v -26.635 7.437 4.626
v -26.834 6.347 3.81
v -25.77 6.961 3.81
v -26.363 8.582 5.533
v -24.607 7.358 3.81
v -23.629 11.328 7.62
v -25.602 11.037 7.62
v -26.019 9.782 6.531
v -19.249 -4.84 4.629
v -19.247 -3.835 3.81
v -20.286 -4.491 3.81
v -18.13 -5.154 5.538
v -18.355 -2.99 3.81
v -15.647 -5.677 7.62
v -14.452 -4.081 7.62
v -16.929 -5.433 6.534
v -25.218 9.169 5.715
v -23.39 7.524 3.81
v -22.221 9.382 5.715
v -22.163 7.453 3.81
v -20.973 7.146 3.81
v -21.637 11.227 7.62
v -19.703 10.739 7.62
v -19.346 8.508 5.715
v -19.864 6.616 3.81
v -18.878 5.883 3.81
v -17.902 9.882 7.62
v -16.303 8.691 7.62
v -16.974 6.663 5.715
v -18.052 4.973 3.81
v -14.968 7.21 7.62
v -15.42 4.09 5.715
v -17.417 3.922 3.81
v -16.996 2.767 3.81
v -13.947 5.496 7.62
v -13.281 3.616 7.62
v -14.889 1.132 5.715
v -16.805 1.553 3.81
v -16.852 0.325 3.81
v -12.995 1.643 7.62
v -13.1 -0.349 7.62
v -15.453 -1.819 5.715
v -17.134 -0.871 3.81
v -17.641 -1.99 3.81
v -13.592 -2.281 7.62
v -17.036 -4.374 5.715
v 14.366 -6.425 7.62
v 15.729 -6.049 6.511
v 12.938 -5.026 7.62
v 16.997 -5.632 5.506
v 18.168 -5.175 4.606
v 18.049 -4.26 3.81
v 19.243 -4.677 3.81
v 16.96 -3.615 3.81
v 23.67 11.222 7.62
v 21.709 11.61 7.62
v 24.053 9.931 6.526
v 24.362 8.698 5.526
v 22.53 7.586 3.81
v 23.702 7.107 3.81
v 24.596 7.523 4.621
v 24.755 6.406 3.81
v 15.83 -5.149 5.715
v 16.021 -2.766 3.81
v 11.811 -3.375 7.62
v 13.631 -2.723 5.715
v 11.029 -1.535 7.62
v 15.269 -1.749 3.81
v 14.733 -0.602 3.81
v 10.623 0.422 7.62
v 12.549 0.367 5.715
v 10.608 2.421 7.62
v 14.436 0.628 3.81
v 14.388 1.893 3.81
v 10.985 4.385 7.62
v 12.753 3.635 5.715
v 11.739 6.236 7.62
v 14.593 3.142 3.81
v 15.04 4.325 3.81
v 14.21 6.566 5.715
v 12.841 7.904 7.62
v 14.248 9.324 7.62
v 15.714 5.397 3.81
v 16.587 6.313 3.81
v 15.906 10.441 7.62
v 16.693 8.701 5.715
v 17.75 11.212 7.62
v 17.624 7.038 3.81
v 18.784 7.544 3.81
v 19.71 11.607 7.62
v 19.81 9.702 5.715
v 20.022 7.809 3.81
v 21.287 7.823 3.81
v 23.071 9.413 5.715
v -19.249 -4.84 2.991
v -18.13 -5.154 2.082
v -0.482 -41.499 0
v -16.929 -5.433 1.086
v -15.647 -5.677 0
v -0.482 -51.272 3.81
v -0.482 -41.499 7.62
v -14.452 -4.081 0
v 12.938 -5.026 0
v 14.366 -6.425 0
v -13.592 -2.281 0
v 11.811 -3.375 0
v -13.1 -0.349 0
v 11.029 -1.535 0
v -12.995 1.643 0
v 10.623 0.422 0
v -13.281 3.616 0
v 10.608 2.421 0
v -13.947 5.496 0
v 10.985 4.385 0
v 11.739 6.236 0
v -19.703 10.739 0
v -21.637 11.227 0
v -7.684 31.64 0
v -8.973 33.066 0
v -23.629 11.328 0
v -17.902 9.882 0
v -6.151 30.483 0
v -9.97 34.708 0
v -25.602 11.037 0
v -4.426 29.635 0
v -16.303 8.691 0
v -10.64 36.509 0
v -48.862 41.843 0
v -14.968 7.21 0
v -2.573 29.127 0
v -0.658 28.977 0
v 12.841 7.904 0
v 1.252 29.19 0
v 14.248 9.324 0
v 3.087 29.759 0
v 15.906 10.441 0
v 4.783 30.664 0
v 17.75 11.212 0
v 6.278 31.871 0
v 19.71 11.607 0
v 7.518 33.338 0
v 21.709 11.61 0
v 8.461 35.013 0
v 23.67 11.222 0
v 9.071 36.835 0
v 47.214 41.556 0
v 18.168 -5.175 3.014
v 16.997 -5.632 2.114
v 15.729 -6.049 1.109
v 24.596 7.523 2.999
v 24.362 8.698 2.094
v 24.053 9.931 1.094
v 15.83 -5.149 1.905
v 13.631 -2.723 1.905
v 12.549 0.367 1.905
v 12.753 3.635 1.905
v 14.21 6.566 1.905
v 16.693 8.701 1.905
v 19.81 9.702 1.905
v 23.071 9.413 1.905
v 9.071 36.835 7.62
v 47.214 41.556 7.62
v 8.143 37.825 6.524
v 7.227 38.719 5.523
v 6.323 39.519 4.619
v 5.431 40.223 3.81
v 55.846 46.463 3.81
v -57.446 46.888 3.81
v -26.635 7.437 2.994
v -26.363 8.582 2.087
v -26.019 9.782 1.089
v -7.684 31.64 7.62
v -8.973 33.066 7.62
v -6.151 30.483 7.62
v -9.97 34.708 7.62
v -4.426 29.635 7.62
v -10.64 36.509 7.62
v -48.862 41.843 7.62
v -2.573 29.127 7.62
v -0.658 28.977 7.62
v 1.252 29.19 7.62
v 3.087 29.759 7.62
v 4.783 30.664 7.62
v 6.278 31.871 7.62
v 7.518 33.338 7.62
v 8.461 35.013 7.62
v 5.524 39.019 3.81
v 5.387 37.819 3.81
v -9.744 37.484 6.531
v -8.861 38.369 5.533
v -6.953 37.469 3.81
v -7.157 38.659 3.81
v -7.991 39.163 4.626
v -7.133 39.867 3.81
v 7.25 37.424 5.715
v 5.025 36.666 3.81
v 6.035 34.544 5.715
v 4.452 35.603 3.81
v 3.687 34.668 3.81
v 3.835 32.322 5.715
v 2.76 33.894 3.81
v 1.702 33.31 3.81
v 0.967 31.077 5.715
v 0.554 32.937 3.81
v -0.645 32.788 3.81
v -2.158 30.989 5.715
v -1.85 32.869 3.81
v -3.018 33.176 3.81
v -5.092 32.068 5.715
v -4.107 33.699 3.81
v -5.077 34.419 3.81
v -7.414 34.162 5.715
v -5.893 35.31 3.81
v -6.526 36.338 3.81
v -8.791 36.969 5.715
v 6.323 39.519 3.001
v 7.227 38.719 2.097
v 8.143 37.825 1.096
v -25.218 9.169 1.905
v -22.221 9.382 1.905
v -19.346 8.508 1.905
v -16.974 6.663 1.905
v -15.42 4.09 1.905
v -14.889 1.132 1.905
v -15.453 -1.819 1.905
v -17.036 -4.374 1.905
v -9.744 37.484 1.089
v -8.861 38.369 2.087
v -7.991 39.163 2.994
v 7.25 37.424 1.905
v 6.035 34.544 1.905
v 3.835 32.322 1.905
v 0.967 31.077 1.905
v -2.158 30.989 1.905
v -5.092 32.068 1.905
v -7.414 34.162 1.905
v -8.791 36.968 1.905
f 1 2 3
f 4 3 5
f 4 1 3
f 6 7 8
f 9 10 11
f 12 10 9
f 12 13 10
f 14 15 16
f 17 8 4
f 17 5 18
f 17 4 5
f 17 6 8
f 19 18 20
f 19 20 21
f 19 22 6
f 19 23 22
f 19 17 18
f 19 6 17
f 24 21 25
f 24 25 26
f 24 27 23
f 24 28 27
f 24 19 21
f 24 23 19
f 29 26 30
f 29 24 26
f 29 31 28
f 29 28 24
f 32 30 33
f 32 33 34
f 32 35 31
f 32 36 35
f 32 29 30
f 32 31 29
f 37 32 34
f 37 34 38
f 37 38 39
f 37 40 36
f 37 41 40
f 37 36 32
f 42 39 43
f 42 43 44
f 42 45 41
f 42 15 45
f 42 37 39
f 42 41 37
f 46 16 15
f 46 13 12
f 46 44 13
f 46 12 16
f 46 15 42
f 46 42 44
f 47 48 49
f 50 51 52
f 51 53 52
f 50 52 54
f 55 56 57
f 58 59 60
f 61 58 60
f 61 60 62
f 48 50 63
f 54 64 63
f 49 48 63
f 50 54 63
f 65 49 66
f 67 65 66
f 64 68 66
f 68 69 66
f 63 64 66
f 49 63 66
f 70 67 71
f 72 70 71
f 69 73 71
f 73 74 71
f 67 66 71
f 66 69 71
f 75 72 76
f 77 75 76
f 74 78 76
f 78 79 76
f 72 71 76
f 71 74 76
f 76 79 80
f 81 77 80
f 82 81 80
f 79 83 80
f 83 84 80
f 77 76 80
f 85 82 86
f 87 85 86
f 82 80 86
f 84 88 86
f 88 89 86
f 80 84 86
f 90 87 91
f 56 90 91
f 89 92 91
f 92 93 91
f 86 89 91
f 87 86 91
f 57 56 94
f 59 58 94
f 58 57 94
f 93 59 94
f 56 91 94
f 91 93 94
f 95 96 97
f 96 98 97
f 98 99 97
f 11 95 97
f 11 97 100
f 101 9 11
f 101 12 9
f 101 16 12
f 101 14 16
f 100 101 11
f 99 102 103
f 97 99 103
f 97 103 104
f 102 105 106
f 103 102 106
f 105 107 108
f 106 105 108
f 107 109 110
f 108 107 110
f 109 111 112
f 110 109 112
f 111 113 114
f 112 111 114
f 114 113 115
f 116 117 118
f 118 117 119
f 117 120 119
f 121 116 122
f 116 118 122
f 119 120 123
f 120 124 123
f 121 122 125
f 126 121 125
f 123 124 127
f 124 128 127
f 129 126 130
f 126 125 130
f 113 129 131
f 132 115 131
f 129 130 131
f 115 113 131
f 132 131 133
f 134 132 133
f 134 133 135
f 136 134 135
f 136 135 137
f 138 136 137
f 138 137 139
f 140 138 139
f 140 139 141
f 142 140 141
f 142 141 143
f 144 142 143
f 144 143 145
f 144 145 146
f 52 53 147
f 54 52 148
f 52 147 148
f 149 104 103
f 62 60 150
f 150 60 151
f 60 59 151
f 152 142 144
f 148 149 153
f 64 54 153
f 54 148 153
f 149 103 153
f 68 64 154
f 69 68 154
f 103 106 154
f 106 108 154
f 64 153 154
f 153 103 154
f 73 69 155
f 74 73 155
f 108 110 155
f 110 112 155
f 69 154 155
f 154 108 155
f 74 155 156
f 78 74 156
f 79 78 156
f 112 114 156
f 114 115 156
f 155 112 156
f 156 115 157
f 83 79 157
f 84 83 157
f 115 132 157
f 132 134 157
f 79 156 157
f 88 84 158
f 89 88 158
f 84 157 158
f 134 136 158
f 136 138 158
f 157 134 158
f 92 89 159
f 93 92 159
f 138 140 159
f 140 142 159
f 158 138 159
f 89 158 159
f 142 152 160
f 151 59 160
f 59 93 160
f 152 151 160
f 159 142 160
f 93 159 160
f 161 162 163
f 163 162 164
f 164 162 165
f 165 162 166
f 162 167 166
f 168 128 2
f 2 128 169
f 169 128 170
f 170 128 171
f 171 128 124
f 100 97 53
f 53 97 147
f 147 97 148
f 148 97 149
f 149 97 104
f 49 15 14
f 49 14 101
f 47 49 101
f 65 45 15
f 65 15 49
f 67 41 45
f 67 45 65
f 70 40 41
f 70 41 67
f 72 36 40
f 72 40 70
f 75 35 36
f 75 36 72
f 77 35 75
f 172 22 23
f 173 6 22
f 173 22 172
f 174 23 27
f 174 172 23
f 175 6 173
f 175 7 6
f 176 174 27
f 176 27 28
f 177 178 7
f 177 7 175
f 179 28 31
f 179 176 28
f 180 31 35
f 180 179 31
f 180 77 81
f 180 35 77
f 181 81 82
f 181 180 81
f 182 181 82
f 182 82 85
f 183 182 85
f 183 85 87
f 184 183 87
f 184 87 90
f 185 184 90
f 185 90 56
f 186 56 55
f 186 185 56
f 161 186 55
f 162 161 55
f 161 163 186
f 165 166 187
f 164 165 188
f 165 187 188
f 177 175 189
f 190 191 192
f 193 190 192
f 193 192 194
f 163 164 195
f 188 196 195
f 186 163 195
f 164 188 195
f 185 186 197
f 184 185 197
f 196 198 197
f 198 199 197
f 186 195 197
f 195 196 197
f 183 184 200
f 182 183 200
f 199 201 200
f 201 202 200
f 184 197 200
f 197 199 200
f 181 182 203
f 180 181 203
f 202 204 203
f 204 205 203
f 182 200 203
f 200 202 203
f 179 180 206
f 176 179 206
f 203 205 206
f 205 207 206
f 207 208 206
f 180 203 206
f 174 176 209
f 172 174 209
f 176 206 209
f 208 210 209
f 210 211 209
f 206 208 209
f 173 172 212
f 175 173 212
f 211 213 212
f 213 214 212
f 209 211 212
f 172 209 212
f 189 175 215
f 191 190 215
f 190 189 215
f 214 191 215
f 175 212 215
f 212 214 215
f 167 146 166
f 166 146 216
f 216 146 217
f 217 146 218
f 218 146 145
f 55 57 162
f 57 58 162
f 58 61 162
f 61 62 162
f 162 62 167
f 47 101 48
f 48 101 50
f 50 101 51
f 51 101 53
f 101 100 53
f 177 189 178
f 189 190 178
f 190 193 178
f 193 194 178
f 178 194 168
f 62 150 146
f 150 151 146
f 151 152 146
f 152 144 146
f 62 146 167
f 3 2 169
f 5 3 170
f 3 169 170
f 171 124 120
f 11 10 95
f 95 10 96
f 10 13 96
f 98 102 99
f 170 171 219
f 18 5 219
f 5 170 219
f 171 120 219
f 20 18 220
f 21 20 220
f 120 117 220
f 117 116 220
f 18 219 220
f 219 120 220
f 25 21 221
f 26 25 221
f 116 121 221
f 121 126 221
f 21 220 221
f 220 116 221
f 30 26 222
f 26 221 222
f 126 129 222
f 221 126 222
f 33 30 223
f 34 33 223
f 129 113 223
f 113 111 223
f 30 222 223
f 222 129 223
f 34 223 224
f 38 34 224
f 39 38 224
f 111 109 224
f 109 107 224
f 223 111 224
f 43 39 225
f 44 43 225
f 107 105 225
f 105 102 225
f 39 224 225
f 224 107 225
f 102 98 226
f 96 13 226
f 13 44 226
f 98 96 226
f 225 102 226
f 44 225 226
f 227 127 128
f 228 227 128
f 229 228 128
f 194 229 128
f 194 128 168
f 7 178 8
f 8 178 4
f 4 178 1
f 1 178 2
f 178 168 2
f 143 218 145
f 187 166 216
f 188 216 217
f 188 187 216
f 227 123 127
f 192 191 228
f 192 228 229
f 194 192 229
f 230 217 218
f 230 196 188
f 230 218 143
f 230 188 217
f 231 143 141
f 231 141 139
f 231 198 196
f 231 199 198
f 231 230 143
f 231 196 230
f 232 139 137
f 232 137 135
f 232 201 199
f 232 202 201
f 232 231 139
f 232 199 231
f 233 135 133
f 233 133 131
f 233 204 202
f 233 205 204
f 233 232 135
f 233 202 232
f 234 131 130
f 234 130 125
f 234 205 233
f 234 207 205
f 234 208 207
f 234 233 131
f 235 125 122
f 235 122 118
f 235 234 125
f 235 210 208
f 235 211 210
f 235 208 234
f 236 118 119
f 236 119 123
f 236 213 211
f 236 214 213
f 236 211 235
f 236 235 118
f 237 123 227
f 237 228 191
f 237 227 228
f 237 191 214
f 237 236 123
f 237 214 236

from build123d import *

# Parameters (mm, degrees)
F1_DEPTH = 7.62
F2_SIZE  = 3.81
F3_SIZE  = 3.80999


# Not quite as in the source:
# - a fillet or chamfer is up to 0.001 mm smaller than in the source, because OpenCascade refuses the exact size
# - a feature names something its author has since deleted; it is built from what else it names


with BuildPart() as f1:
    # F0 (on Top) → F1 (new body)
    with BuildSketch(Plane.XY):
        with BuildLine():
            Line((-20.2860954264, -4.4913191196), (-0.4820694779, -51.2720903428))
            Line((-0.4820694779, -51.2720903428), (19.2434711163, -4.6767160388))
            ThreePointArc((19.2434711163, -4.6767160388), (15.0404138493, 4.3253448413), (24.7550324356, 6.4059640289))
            Line((24.7550324356, 6.4059640289), (55.8461389062, 46.4629190132))
            Line((55.8461389062, 46.4629190132), (5.4307896441, 40.2233229702))
            ThreePointArc((5.4307896441, 40.2233229702), (-0.645142483, 32.7880593977), (-7.1331060464, 39.8666485513))
            Line((-7.1331060464, 39.8666485513), (-57.4455202297, 46.8881141422))
            Line((-57.4455202297, 46.8881141422), (-26.8341969161, 6.3469389621))
            ThreePointArc((-26.8341969161, 6.3469389621), (-17.7091606963, 4.4627734196), (-20.2860954264, -4.4913191196))
        make_face()
    extrude(amount=F1_DEPTH)

    # F2
    f2_edges = [f1.edges().sort_by_distance(p)[0] for p in [
        (-32.289313, 43.377381, 0),
        (30.638464, 43.343121, 0),
        (-42.139859, 26.617527, 0),
        (40.300586, 26.434442, 0),
        (9.380701, -27.974403, 0),
        (-10.384082, -27.881705, 0),
        (15.040414, 4.325345, 0),
    ]]
    chamfer(f2_edges, length=F2_SIZE)

    # F3 (size 3.81 in the source; OpenCascade refuses exactly that, so slightly less here)
    f3_edges = [f1.edges().sort_by_distance(p)[0] for p in [
        (-32.289313, 43.377381, 7.62),
        (-42.139859, 26.617527, 7.62),
        (-10.384082, -27.881705, 7.62),
        (9.380701, -27.974403, 7.62),
        (40.300586, 26.434442, 7.62),
        (30.638464, 43.343121, 7.62),
        (15.040414, 4.325345, 7.62),
        (-0.645142, 32.788059, 7.62),
        (-17.709161, 4.462773, 7.62),
        (-17.729481, 4.496175, 0),
        (-0.591, 32.789828, 0),
    ]]
    chamfer(f3_edges, length=F3_SIZE)


solid = f1.part
